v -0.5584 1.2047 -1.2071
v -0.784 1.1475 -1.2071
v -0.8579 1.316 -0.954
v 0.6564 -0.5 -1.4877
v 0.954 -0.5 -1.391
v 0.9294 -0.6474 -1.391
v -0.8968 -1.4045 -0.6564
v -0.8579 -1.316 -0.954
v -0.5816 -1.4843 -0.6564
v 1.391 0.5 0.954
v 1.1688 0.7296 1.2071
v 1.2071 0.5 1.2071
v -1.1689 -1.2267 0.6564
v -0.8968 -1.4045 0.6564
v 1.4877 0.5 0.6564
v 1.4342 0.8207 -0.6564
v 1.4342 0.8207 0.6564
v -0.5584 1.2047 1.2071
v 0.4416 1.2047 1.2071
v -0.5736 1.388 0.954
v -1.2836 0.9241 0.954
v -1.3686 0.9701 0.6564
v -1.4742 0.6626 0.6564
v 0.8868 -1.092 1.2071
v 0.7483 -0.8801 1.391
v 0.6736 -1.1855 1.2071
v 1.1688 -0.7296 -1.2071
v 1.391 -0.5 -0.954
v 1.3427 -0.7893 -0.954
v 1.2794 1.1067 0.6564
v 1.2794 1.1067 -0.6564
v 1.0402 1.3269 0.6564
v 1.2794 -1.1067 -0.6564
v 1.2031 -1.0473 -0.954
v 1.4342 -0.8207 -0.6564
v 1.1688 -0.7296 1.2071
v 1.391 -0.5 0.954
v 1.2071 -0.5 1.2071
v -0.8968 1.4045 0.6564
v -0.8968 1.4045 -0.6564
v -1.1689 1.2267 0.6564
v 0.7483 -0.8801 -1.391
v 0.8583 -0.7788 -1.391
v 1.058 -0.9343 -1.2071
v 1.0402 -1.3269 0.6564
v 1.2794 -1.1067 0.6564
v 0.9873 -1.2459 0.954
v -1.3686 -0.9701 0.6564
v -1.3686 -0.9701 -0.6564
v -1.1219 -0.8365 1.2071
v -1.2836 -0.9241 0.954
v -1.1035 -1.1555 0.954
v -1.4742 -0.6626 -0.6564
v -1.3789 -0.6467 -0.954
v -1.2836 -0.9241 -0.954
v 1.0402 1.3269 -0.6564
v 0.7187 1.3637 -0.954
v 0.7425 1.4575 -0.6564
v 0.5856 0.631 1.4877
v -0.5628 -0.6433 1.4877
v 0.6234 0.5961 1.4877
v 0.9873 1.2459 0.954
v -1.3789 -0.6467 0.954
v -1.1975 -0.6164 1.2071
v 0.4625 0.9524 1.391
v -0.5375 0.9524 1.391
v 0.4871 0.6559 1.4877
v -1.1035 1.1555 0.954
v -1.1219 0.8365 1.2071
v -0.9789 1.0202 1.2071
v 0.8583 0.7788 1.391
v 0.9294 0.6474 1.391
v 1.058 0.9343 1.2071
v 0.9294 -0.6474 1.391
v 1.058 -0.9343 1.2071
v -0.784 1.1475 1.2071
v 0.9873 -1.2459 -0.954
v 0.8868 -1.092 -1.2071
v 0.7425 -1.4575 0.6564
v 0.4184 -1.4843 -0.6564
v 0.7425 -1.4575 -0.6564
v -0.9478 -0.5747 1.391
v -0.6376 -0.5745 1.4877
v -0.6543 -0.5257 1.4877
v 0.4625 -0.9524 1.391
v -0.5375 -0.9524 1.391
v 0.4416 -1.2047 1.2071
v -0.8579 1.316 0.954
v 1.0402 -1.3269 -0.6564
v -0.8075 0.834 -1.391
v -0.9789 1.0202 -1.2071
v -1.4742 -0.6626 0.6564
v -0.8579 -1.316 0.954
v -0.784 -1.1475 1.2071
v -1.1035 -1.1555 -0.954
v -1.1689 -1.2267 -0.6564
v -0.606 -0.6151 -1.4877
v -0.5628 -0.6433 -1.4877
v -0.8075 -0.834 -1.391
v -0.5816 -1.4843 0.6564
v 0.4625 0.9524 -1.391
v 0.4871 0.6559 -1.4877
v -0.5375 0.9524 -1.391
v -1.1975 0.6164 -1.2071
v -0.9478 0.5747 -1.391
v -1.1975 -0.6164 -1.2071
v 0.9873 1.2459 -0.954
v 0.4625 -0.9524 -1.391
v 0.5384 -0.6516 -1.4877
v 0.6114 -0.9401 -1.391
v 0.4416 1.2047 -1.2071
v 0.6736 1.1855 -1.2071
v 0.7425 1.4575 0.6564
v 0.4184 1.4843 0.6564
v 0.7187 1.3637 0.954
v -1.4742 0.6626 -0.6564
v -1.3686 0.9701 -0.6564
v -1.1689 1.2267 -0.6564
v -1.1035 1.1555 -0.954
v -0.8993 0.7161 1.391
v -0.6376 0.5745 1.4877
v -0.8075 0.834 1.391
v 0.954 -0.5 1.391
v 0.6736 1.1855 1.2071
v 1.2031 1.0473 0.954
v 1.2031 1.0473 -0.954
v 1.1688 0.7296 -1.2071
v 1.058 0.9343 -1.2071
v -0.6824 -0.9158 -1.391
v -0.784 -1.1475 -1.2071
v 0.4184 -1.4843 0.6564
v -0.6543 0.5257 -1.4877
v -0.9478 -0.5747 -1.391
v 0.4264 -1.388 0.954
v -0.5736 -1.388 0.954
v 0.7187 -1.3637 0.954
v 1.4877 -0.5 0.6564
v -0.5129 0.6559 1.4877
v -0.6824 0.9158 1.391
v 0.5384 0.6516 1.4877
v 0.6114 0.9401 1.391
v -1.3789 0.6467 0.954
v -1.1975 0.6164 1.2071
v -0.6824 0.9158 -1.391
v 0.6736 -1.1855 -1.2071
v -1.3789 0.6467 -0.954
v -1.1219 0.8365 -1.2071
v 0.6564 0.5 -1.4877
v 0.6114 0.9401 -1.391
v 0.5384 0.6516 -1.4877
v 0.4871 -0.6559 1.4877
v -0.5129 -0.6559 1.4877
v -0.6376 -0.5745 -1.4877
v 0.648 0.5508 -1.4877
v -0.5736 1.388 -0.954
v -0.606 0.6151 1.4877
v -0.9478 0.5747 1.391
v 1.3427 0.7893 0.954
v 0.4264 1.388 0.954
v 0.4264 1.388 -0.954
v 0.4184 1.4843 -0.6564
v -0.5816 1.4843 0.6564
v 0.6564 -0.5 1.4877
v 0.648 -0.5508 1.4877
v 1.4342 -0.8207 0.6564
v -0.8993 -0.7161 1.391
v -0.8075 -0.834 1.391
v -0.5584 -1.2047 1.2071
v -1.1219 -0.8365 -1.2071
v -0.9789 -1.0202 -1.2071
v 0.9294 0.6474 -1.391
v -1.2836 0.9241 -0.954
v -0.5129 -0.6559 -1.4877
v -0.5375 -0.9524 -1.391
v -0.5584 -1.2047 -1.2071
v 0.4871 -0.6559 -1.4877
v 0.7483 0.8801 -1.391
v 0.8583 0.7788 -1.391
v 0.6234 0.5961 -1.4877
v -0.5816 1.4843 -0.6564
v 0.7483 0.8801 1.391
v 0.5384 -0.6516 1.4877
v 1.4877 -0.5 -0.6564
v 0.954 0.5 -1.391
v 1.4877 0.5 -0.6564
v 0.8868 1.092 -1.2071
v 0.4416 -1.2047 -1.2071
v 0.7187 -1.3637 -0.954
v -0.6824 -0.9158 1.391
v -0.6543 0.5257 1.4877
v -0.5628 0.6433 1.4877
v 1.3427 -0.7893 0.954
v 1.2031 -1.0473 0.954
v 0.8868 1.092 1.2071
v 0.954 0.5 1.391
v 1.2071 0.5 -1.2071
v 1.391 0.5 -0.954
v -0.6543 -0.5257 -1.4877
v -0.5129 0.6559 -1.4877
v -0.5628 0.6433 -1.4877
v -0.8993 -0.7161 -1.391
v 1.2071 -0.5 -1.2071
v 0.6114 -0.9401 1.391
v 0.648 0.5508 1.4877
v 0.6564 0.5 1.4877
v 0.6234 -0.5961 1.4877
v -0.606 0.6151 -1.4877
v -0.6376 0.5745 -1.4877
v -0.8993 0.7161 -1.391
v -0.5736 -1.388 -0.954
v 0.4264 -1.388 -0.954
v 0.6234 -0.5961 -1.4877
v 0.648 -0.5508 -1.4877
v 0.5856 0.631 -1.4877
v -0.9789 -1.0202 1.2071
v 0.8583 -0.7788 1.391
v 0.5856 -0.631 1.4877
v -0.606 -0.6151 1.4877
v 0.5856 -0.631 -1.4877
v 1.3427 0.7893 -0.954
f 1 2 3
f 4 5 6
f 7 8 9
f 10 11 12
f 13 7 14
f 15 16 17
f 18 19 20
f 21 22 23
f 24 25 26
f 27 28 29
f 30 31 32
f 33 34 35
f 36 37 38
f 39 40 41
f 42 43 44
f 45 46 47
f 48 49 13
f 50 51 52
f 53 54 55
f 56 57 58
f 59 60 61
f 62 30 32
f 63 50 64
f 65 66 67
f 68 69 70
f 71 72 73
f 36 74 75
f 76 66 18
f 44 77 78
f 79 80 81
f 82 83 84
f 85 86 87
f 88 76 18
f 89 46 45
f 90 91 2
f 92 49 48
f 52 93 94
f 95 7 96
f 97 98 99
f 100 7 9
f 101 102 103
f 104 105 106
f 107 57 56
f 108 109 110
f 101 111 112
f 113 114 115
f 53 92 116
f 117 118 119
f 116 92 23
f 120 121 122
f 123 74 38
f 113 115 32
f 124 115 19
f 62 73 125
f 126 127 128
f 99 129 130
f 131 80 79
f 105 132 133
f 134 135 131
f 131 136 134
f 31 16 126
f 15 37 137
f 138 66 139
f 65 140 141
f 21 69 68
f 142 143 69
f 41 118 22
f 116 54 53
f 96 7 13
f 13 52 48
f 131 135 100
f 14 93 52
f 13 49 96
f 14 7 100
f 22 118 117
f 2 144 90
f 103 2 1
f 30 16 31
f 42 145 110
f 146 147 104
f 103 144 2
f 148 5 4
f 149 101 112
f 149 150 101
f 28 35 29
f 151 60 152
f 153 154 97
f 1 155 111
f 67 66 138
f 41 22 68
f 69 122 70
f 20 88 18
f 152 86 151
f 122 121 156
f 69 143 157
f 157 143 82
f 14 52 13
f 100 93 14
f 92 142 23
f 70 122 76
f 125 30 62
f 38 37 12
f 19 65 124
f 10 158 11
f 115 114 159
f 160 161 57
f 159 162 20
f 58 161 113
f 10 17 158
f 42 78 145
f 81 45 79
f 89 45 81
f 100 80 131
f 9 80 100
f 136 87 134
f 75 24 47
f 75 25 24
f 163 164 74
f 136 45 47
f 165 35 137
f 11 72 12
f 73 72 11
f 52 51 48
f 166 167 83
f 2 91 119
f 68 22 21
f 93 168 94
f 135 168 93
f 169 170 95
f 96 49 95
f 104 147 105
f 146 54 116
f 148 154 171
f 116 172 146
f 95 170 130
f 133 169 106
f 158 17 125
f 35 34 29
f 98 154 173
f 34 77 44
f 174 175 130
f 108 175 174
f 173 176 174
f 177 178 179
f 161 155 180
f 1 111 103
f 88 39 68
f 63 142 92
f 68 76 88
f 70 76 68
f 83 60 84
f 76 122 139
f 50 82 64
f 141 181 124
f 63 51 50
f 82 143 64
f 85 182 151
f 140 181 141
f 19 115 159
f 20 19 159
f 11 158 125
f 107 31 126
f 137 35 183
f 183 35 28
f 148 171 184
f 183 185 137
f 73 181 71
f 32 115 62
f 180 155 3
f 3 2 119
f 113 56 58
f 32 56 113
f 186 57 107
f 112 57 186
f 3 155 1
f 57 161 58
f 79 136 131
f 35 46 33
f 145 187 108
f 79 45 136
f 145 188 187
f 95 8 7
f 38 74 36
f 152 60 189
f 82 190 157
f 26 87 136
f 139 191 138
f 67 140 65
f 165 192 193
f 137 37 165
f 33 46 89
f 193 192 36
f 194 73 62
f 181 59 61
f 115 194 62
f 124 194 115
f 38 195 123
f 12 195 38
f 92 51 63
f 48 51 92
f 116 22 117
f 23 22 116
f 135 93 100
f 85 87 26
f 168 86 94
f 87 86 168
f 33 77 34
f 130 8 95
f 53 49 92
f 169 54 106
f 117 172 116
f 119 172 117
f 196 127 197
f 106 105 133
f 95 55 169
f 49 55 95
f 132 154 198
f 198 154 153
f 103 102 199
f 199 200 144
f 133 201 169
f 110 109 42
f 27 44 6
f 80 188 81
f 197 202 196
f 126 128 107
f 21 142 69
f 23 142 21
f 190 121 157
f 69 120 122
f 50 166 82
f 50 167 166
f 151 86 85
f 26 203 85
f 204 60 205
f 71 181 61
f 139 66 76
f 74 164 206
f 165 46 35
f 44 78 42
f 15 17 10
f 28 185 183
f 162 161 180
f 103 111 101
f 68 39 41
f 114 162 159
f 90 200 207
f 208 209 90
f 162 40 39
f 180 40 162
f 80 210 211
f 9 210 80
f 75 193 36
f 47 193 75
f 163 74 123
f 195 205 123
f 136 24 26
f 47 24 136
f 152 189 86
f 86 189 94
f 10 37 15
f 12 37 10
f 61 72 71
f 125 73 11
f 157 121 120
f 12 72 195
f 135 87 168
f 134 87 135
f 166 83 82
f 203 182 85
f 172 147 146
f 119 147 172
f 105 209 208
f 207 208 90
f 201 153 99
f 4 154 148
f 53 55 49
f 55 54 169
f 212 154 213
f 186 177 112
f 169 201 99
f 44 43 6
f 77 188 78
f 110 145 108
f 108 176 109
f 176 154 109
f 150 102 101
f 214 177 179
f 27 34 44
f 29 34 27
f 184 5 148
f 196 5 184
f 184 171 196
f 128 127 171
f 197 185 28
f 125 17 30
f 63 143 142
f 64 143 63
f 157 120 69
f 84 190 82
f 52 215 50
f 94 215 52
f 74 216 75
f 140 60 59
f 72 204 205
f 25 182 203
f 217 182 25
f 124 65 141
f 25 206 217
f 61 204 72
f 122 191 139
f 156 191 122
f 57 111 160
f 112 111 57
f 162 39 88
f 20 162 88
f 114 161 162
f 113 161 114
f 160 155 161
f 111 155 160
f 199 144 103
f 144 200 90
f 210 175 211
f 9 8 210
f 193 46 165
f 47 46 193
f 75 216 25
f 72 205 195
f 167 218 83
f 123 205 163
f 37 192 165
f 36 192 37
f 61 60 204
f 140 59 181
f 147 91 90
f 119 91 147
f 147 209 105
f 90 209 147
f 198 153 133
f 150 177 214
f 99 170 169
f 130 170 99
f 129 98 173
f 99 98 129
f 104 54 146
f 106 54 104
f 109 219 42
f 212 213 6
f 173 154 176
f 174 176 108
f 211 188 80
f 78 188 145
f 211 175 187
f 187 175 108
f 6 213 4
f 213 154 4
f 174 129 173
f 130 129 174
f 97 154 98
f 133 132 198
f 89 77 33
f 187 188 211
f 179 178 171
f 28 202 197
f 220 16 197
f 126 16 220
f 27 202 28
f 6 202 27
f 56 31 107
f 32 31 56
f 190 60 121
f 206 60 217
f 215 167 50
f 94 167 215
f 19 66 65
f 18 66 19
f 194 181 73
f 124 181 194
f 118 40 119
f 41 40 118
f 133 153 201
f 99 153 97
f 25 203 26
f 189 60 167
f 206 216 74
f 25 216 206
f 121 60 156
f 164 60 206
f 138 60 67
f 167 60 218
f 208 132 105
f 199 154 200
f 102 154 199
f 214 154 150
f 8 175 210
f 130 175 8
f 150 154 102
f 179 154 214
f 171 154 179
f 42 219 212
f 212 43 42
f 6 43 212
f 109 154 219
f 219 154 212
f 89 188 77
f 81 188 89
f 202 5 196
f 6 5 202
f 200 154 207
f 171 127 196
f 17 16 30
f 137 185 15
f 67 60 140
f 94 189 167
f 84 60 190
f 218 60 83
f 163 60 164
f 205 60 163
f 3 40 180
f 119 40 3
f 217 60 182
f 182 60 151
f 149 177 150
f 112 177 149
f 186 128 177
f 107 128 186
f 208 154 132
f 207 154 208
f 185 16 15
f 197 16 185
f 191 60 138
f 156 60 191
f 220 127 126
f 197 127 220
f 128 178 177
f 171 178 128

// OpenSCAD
//------------------------------------------------------------------------------------------
// THIS CODE WAS GENERATED WITH GRAPHSCAD
//------------------------------------------------------------------------------------------
// Graphscad is a graphical nodal editor to create .SCAD files
//
// More info : http://graphscad.free.fr
//
// Scad Files created with Graphscad can be edited by graphscad
// Scad Files created with Graphscad can be read by Openscad
//
//------------------------------------------------------------------------------------------
module minkovski()
{
 function node_cube_matrix(i=0,j=0,k=0,l=0,m=0,n=0) = translate([-1.0,0,0]);
 module node_cube(i=0,j=0,k=0,l=0,m=0,n=0)
 {
  translate([-1.0,0,0])cube([1,1,1],center=true);
 }
 function node_sphere_matrix(i=0,j=0,k=0,l=0,m=0,n=0) = translate([1.0,0,0]);
 module node_sphere(i=0,j=0,k=0,l=0,m=0,n=0)
 {
  translate([1.0,0,0]) sphere(r=1,$fn=(16+1*3.14116));
 }
 function node_minkowski_matrix(i=0,j=0,k=0,l=0,m=0,n=0) = node_cube_matrix(i=i,j=j,k=k,l=l,m=m,n=n);
 module node_minkowski(i=0,j=0,k=0,l=0,m=0,n=0)
 {
  minkowski()
  {
   node_cube(i,j,k,l,m,n);
   node_sphere(i,j,k,l,m,n);
  }
 }
 node_minkowski();
 /*--------------------------------------------------------------------------------------------------------
  Graphscad Utils functions
  This code is Used By Graphscad Nodal Editor to generate SCAD files
 --------------------------------------------------------------------------------------------------------*/
 function det4x4(a) =
 a[0][0]*a[1][1]*a[2][2]*a[3][3] + a[0][0]*a[1][2]*a[2][3]*a[3][1] + a[0][0]*a[1][3]*a[2][1]*a[3][2]
 + a[0][1]*a[1][0]*a[2][3]*a[3][2] + a[0][1]*a[1][2]*a[2][0]*a[3][3] + a[0][1]*a[1][3]*a[2][2]*a[3][0]
 + a[0][2]*a[1][0]*a[2][1]*a[3][3] + a[0][2]*a[1][1]*a[2][3]*a[3][0] + a[0][2]*a[1][3]*a[2][0]*a[3][1]
 + a[0][3]*a[1][0]*a[2][2]*a[3][1] + a[0][3]*a[1][1]*a[2][0]*a[3][2] + a[0][3]*a[1][2]*a[2][1]*a[3][0]
 - a[0][0]*a[1][1]*a[2][3]*a[3][2] - a[0][0]*a[1][2]*a[2][1]*a[3][3] - a[0][0]*a[1][3]*a[2][2]*a[3][1]
 - a[0][1]*a[1][0]*a[2][2]*a[3][3] - a[0][1]*a[1][2]*a[2][3]*a[3][0] - a[0][1]*a[1][3]*a[2][0]*a[3][2]
 - a[0][2]*a[1][0]*a[2][3]*a[3][1] - a[0][2]*a[1][1]*a[2][0]*a[3][3] - a[0][2]*a[1][3]*a[2][1]*a[3][0]
 - a[0][3]*a[1][0]*a[2][1]*a[3][2] - a[0][3]*a[1][1]*a[2][2]*a[3][0] - a[0][3]*a[1][2]*a[2][0]*a[3][1];
 function invb00(a) = a[1][1]*a[2][2]*a[3][3] + a[1][2]*a[2][3]*a[3][1] + a[1][3]*a[2][1]*a[3][2] - a[1][1]*a[2][3]*a[3][2] - a[1][2]*a[2][1]*a[3][3] - a[1][3]*a[2][2]*a[3][1];
 function invb01(a) = a[0][1]*a[2][3]*a[3][2] + a[0][2]*a[2][1]*a[3][3] + a[0][3]*a[2][2]*a[3][1] - a[0][1]*a[2][2]*a[3][3] - a[0][2]*a[2][3]*a[3][1] - a[0][3]*a[2][1]*a[3][2];
 function invb02(a) = a[0][1]*a[1][2]*a[3][3] + a[0][2]*a[1][3]*a[3][1] + a[0][3]*a[1][1]*a[3][2] - a[0][1]*a[1][3]*a[3][2] - a[0][2]*a[1][1]*a[3][3] - a[0][3]*a[1][2]*a[3][1];
 function invb03(a) = a[0][1]*a[1][3]*a[2][2] + a[0][2]*a[1][1]*a[2][3] + a[0][3]*a[1][2]*a[2][1] - a[0][1]*a[1][2]*a[2][3] - a[0][2]*a[1][3]*a[2][1] - a[0][3]*a[1][1]*a[2][2];
 function invb10(a) = a[1][0]*a[2][3]*a[3][2] + a[1][2]*a[2][0]*a[3][3] + a[1][3]*a[2][2]*a[3][0] - a[1][0]*a[2][2]*a[3][3] - a[1][2]*a[2][3]*a[3][0] - a[1][3]*a[2][0]*a[3][2];
 function invb11(a) = a[0][0]*a[2][2]*a[3][3] + a[0][2]*a[2][3]*a[3][0] + a[0][3]*a[2][0]*a[3][2] - a[0][0]*a[2][3]*a[3][2] - a[0][2]*a[2][0]*a[3][3] - a[0][3]*a[2][2]*a[3][0];
 function invb12(a) = a[0][0]*a[1][3]*a[3][2] + a[0][2]*a[1][0]*a[3][3] + a[0][3]*a[1][2]*a[3][0] - a[0][0]*a[1][2]*a[3][3] - a[0][2]*a[1][3]*a[3][0] - a[0][3]*a[1][0]*a[3][2];
 function invb13(a) = a[0][0]*a[1][2]*a[2][3] + a[0][2]*a[1][3]*a[2][0] + a[0][3]*a[1][0]*a[2][2] - a[0][0]*a[1][3]*a[2][2] - a[0][2]*a[1][0]*a[2][3] - a[0][3]*a[1][2]*a[2][0];
 function invb20(a) = a[1][0]*a[2][1]*a[3][3] + a[1][1]*a[2][3]*a[3][0] + a[1][3]*a[2][0]*a[3][1] - a[1][0]*a[2][3]*a[3][1] - a[1][1]*a[2][0]*a[3][3] - a[1][3]*a[2][1]*a[3][0];
 function invb21(a) = a[0][0]*a[2][3]*a[3][1] + a[0][1]*a[2][0]*a[3][3] + a[0][3]*a[2][1]*a[3][0] - a[0][0]*a[2][1]*a[3][3] - a[0][1]*a[2][3]*a[3][0] - a[0][3]*a[2][0]*a[3][1];
 function invb22(a) = a[0][0]*a[1][1]*a[3][3] + a[0][1]*a[1][3]*a[3][0] + a[0][3]*a[1][0]*a[3][1] - a[0][0]*a[1][3]*a[3][1] - a[0][1]*a[1][0]*a[3][3] - a[0][3]*a[1][1]*a[3][0];
 function invb23(a) = a[0][0]*a[1][3]*a[2][1] + a[0][1]*a[1][0]*a[2][3] + a[0][3]*a[1][1]*a[2][0] - a[0][0]*a[1][1]*a[2][3] - a[0][1]*a[1][3]*a[2][0] - a[0][3]*a[1][0]*a[2][1];
 function invb30(a) = a[1][0]*a[2][2]*a[3][1] + a[1][1]*a[2][0]*a[3][2] + a[1][2]*a[2][1]*a[3][0] - a[1][0]*a[2][1]*a[3][2] - a[1][1]*a[2][2]*a[3][0] - a[1][2]*a[2][0]*a[3][1];
 function invb31(a) = a[0][0]*a[2][1]*a[3][2] + a[0][1]*a[2][2]*a[3][0] + a[0][2]*a[2][0]*a[3][1] - a[0][0]*a[2][2]*a[3][1] - a[0][1]*a[2][0]*a[3][2] - a[0][2]*a[2][1]*a[3][0];
 function invb32(a) = a[0][0]*a[1][2]*a[3][1] + a[0][1]*a[1][0]*a[3][2] + a[0][2]*a[1][1]*a[3][0] - a[0][0]*a[1][1]*a[3][2] - a[0][1]*a[1][2]*a[3][0] - a[0][2]*a[1][0]*a[3][1];
 function invb33(a) = a[0][0]*a[1][1]*a[2][2] + a[0][1]*a[1][2]*a[2][0] + a[0][2]*a[1][0]*a[2][1] - a[0][0]*a[1][2]*a[2][1] - a[0][1]*a[1][0]*a[2][2] - a[0][2]*a[1][1]*a[2][0];
 function inv4x4(a)= (1/det4x4(a))*[
 [invb00(a),invb01(a),invb02(a),invb03(a)],
 [invb10(a),invb11(a),invb12(a),invb13(a)],
 [invb20(a),invb21(a),invb22(a),invb23(a)],
 [invb30(a),invb31(a),invb32(a),invb33(a)]];
 function onlytranslate(a)=  [
                        [1,0,0,a[0][3]],
                        [0,1,0,a[1][3]],
                        [0,0,1,a[2][3]],
                        [0,0,0,1]];
 function negonlytranslate(a)=[
                        [1,0,0,-a[0][3]],
                        [0,1,0,-a[1][3]],
                        [0,0,1,-a[2][3]],
                        [0,0,0,1]];
 function lookatvec(t,parentmat) = [t[0]-parentmat[0][3],
                                 t[1]-parentmat[1][3],
                                 t[2]-parentmat[2][3]];
 /*
              rx = '0'
              ry = 'acos('+tz+'/norm(['+tx+','+ty+','+tz+']))'
              rz = 'atan2('+ty+','+tx+')'
 */
 function lookatrot(t,parentmat) = [0,
                                 acos((t[2]-parentmat[2][3])/norm(lookatvec(t,parentmat))),
                                 atan2(t[1]-parentmat[1][3],t[0]-parentmat[0][3])];
 function gettranslation(m) = [m[0][3],m[1][3],m[2][3]];
 function vectormulmatrix(v,m) = m*v;
 function vectorlength(v) = norm(v);
 function vectorx(v) = v[0];
 function vectory(v) = v[1];
 function vectorz(v) = v[2];
 function vectoradd(a,b) = (a+b);
 function vectorsub(a,b) = (a-b);
 function vectormul(a,b) = (a*b);
 function vectordiv(a,b) = (a*(1/b));
 function scale(v)=[[v[0],0,0,0],
                    [0,v[1],0,0],
                    [0,0,v[2],0],
                    [0,0,0,1]];
 function rotatex(a)=[[1,0,0,0],
                      [0,cos(a),-sin(a),0],
                      [0,sin(a),cos(a),0],
                      [0,0,0,1]];
 function rotatey(a)=[[cos(a),0,sin(a),0],
                      [0,1,0,0],
                      [-sin(a),0,cos(a),0],
                      [0,0,0,1]];
 function rotatez(a)=[[cos(a),-sin(a),0,0],
                      [sin(a),cos(a),0,0],
                      [0,0,1,0],
                      [0,0,0,1]];
 function rotatea(c,s,l,m,n)=[[l*l*(1-c)+c,m*l*(1-c)-n*s,n*l*(1-c)+m*s,0],
                              [l*m*(1-c)+n*s,m*m*(1-c)+c,n*m*(1-c)-l*s,0],
                              [l*n*(1-c)-m*s,m*n*(1-c)+l*s,n*n*(1-c)+c,0],
                              [0,0,0,1]];
 function rotateanv(a,nv)=rotatea(cos(a),sin(a),nv[0],nv[1],nv[2]);
 function rotate(a,v, normV=true)=(v==undef)?rotatez(a[2])*rotatey(a[1])*rotatex(a[0]):
                      normV ? rotateanv(a,v/sqrt(v*v)) : rotateanv(a,v);
 function translate(v)=[[1,0,0,v[0]],
                        [0,1,0,v[1]],
                        [0,0,1,v[2]],
                        [0,0,0,1]];
 function mirrorabc(a,b,c)=[[1-2*a*a,-2*a*b,-2*a*c,0],
                            [-2*a*b,1-2*b*b,-2*b*c,0],
                            [-2*a*c,-2*b*c,1-2*c*c,0],
                            [0,0,0,1]];
 function mirrornv(nv)=mirrorabc(nv[0],nv[1],nv[2]);
 function mirror(v)=mirrornv(v/sqrt(v*v));
}
minkovski();


/*BEGINGRAPHSCAD{
    "nodes": [
        {
            "name": "node_cube",
            "inputplugs": [
                {
                    "type": "str",
                    "name": "sizex",
                    "value": "1"
                },
                {
                    "type": "str",
                    "name": "sizey",
                    "value": "1"
                },
                {
                    "type": "str",
                    "name": "sizez",
                    "value": "1"
                },
                {
                    "type": "str",
                    "name": "tx",
                    "value": "-1.0"
                },
                {
                    "type": "str",
                    "name": "ty",
                    "value": "0"
                },
                {
                    "type": "str",
                    "name": "tz",
                    "value": "0"
                },
                {
                    "type": "str",
                    "name": "center",
                    "value": "true",
                    "combo": [
                        "true",
                        "false"
                    ]
                }
            ],
            "typename": "Node_cube",
            "version": 1,
            "y": -215.64231249999992,
            "x": -653.4416875
        },
        {
            "name": "node_sphere",
            "inputplugs": [
                {
                    "type": "str",
                    "name": "radius",
                    "value": "1"
                },
                {
                    "type": "str",
                    "name": "tx",
                    "value": "1.0"
                },
                {
                    "type": "str",
                    "name": "ty",
                    "value": "0"
                },
                {
                    "type": "str",
                    "name": "tz",
                    "value": "0"
                },
                {
                    "type": "str",
                    "name": "$fn",
                    "value": ""
                }
            ],
            "typename": "Node_sphere",
            "version": 1,
            "y": 27.435687500000114,
            "x": -657.7751874999998
        },
        {
            "name": "node_minkowski",
            "inputplugs": [
                {
                    "type": "str",
                    "name": "tx",
                    "value": "0"
                },
                {
                    "type": "str",
                    "name": "ty",
                    "value": "0"
                },
                {
                    "type": "str",
                    "name": "tz",
                    "value": "0"
                },
                {
                    "connection": "node_cube.object",
                    "type": "object",
                    "name": "object1",
                    "value": ""
                },
                {
                    "connection": "node_sphere.object",
                    "type": "object",
                    "name": "object2",
                    "value": ""
                },
                {
                    "type": "object",
                    "name": "object3",
                    "value": ""
                },
                {
                    "type": "object",
                    "name": "object4",
                    "value": ""
                },
                {
                    "type": "object",
                    "name": "object5",
                    "value": ""
                },
                {
                    "type": "object",
                    "name": "object6",
                    "value": ""
                },
                {
                    "type": "object",
                    "name": "object7",
                    "value": ""
                },
                {
                    "type": "object",
                    "name": "object8",
                    "value": ""
                }
            ],
            "typename": "Node_minkowski",
            "version": 1,
            "y": -118.48431249999992,
            "x": -442.2231875000001
        }
    ],
    "version": 2
}ENDGRAPHSCAD*/
